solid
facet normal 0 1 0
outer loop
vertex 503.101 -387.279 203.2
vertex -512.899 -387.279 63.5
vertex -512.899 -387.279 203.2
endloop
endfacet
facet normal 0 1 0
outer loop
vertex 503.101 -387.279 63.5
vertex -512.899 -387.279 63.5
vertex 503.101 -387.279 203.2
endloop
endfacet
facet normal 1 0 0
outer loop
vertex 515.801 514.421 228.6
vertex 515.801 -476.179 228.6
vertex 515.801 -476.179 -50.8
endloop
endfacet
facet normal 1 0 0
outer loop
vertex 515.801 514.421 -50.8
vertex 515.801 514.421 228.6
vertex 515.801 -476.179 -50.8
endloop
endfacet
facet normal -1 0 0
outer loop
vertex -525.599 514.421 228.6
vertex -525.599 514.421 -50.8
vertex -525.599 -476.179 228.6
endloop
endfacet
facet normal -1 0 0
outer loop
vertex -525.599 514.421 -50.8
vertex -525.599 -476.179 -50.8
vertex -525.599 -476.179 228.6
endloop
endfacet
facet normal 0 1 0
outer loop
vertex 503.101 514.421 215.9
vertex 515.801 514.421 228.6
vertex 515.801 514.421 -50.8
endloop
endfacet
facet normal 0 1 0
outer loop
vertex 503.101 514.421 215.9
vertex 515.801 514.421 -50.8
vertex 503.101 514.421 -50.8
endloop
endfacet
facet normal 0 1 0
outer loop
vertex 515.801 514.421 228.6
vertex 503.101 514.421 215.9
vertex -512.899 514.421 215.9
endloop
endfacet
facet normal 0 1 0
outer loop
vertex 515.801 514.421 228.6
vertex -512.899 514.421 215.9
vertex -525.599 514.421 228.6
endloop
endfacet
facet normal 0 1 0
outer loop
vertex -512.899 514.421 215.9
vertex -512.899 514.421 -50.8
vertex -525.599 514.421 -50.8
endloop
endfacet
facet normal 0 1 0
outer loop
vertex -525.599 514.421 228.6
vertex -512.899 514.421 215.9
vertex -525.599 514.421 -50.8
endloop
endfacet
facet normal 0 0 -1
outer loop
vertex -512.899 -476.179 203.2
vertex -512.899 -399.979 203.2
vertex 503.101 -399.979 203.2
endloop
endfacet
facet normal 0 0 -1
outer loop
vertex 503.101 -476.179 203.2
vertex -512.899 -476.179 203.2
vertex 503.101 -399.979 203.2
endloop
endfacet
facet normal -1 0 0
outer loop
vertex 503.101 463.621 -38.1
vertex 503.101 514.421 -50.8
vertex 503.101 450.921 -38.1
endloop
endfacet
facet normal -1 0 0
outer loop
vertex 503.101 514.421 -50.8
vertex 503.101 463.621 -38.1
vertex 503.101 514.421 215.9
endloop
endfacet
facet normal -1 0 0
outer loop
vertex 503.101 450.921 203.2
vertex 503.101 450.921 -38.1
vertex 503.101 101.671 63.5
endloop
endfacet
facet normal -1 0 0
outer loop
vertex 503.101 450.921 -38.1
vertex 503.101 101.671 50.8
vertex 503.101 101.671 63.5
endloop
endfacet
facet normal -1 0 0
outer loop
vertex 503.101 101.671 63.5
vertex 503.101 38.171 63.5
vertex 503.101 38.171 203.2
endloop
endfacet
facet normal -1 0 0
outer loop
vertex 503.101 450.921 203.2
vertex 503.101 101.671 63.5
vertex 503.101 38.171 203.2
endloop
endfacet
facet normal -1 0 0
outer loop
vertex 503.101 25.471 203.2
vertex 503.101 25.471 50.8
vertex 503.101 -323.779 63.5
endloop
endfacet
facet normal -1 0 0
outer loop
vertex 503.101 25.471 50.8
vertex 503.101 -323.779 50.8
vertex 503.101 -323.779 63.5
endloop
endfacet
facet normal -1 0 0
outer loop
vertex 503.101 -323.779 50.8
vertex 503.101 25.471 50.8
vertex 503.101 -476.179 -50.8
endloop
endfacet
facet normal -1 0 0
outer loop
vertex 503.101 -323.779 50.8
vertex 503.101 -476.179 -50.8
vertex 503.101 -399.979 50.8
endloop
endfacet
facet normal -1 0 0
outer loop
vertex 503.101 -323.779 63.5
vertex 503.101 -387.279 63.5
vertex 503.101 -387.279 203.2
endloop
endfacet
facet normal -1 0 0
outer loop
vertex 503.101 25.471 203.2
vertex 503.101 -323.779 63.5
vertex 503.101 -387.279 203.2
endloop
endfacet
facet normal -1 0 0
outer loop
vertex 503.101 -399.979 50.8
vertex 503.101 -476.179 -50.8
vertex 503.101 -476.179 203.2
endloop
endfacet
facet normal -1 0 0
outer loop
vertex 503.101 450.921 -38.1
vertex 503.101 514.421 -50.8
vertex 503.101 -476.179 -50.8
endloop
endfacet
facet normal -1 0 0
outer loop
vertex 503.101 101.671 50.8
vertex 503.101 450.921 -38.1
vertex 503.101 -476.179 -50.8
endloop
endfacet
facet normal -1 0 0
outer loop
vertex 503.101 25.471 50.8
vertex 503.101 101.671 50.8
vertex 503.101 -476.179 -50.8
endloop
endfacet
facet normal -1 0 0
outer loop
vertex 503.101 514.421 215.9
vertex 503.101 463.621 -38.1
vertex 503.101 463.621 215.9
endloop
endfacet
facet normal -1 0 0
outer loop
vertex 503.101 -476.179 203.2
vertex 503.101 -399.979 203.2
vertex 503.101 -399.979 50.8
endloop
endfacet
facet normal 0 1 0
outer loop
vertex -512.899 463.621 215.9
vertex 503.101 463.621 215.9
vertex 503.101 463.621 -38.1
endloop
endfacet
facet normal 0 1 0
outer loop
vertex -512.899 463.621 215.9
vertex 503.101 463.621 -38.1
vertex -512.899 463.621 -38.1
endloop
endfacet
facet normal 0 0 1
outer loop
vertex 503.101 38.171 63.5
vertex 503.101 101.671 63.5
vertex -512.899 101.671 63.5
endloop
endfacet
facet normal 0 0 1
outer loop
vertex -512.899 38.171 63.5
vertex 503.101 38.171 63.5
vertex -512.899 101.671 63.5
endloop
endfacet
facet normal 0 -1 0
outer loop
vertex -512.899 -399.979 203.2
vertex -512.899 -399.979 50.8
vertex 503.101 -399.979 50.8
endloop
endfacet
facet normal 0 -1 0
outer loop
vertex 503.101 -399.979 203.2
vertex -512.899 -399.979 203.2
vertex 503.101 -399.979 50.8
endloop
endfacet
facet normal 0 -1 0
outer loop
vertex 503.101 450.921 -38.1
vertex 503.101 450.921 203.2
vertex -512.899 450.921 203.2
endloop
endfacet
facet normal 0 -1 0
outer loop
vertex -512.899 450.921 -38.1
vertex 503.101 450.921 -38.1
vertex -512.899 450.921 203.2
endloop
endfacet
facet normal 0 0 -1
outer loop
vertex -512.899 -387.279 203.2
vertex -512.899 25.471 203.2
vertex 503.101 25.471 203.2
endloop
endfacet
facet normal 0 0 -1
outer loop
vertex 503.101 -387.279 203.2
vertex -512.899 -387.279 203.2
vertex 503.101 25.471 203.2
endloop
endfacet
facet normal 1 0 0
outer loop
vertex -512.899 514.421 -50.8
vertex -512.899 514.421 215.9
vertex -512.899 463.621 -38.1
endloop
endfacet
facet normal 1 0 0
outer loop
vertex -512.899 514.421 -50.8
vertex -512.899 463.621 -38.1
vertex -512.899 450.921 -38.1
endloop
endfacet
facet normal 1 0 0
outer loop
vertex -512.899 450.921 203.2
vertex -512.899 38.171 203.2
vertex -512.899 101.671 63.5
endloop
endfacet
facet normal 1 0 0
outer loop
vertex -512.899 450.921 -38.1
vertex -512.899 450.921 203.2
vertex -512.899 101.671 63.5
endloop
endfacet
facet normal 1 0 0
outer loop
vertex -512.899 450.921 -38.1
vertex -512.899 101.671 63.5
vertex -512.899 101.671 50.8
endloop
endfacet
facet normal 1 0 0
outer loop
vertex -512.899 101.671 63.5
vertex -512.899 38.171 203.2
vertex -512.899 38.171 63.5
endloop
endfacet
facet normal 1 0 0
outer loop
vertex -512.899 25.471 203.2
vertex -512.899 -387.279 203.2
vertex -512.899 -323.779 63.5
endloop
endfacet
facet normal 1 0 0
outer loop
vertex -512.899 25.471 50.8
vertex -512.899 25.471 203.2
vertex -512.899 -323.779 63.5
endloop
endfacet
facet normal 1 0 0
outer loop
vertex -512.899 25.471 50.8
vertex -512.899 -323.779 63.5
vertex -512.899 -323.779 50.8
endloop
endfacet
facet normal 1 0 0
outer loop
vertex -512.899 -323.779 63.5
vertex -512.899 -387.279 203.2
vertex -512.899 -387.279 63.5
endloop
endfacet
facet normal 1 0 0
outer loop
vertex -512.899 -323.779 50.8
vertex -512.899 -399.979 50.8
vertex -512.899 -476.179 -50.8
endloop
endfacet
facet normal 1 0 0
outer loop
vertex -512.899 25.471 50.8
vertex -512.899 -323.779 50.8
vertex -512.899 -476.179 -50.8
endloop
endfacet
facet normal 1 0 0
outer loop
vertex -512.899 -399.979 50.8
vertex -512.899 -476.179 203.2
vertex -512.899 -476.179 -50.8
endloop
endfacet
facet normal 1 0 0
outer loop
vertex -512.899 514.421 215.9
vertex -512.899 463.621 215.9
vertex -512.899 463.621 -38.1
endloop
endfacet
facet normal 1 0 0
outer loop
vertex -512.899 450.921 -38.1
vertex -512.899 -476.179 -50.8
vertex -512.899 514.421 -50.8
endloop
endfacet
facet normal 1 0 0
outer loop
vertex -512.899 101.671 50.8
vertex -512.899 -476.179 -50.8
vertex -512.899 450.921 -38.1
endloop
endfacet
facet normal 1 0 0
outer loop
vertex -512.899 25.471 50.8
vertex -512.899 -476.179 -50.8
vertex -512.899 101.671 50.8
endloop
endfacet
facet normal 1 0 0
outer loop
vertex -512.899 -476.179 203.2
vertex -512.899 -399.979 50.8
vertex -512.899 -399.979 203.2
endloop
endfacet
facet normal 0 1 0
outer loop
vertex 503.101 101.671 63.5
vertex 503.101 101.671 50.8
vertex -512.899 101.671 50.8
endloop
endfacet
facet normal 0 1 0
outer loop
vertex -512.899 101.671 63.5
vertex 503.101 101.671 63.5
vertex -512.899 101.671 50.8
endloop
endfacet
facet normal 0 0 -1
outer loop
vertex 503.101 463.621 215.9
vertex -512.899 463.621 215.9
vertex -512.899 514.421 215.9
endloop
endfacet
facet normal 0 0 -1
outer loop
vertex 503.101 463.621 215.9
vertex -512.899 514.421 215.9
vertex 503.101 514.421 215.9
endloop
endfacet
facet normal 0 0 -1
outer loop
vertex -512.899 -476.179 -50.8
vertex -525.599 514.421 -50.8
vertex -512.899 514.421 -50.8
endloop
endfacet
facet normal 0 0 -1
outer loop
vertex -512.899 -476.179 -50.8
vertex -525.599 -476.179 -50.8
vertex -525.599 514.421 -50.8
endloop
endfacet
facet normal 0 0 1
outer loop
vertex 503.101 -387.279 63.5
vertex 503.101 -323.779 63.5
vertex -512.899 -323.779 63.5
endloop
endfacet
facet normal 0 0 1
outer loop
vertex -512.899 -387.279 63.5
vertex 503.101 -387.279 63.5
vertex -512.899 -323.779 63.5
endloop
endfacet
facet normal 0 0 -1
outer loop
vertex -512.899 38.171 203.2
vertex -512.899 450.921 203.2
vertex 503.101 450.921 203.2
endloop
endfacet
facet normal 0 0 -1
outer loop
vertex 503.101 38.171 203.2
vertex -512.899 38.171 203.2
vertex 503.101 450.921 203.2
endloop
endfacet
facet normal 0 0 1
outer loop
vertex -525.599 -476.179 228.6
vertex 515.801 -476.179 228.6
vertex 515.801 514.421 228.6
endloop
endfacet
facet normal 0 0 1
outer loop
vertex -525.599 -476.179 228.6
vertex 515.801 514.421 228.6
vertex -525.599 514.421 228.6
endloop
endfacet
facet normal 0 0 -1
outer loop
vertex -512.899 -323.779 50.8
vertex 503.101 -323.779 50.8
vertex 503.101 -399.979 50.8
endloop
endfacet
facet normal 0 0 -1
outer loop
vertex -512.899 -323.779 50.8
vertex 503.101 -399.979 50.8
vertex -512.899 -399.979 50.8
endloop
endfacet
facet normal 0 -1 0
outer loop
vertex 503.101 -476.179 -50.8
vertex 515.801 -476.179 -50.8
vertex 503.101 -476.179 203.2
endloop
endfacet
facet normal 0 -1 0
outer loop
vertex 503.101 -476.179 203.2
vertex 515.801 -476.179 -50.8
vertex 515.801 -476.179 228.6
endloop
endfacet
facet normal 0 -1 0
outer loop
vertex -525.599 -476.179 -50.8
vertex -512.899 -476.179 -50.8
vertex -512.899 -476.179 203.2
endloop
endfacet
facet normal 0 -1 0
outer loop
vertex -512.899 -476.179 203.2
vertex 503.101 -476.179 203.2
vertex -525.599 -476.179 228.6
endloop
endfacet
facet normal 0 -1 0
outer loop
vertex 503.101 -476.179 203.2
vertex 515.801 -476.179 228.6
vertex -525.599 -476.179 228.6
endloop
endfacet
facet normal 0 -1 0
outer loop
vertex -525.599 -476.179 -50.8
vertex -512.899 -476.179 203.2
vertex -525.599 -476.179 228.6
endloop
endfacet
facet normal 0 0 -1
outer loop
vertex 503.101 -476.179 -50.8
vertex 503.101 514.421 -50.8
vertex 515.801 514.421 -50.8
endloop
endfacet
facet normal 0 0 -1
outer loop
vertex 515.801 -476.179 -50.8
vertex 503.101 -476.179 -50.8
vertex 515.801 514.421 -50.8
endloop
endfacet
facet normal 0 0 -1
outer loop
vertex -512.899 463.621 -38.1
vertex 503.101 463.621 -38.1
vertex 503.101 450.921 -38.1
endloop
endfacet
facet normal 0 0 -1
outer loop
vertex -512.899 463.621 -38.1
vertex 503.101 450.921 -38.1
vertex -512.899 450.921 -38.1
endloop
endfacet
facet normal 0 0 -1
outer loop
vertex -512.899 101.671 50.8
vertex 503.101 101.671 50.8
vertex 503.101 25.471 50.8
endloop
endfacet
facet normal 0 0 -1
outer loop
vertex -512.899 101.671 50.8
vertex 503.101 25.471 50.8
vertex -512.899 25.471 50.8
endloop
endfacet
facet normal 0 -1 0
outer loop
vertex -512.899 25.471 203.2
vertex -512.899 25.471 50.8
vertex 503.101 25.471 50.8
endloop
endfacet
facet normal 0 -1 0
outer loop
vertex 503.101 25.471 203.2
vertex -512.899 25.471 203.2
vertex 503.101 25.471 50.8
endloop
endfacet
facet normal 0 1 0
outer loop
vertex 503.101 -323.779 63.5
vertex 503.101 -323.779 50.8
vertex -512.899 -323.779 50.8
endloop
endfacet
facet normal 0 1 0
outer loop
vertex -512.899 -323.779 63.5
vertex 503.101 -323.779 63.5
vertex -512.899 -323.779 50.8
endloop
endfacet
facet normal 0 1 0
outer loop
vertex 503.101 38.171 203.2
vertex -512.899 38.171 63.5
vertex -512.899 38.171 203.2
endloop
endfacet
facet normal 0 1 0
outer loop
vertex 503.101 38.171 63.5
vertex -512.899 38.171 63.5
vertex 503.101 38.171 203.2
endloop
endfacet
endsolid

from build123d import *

# Parameters (mm, degrees)
SKETCH1_W            = 1016
SKETCH1_H            = 412.75
BOSS_EXTRUDE2_DEPTH  = 203.2
SKETCH3_W            = 1041.4
SKETCH3_H            = 939.8
BOSS_EXTRUDE4_DEPTH  = 25.4
SKETCH6_W            = 12.7
SKETCH6_H            = 939.8
BOSS_EXTRUDE7_DEPTH  = 50.8
SKETCH7_W            = 12.7
SKETCH7_H            = 939.8
BOSS_EXTRUDE8_DEPTH  = 50.8
BOSS_EXTRUDE9_DEPTH  = 50.8
SKETCH10_W           = 1016
SKETCH10_H           = 514.35
CUT_EXTRUDE1_DEPTH   = 50.8
SKETCH11_W           = 1016
SKETCH11_H           = 12.7
BOSS_EXTRUDE11_DEPTH = 38.1
SKETCH13_W           = 1016
SKETCH13_H           = 76.2
BOSS_EXTRUDE12_DEPTH = 12.7


with BuildPart() as part:
    # Sketch1 → Boss-Extrude2 (new body)
    with BuildSketch(Plane.XY):
        Polygon((-512.899336879, -399.978806382), (503.100663121, -399.978806382), (503.100663121, -463.478806382), (503.100663121, -476.178806382), (515.800663121, -476.178806382), (515.800663121, 463.621193618), (-525.599336879, 463.621193618), (-525.599336879, -476.178806382), (-512.899336879, -476.178806382), (-512.899336879, -463.478806382), align=None)
        with Locations((-4.899336879, 244.546193618)):
            Rectangle(SKETCH1_W, SKETCH1_H, mode=Mode.SUBTRACT)
        with Locations((-4.899336879, -180.903806382)):
            Rectangle(SKETCH1_W, SKETCH1_H, mode=Mode.SUBTRACT)
    extrude(amount=BOSS_EXTRUDE2_DEPTH)

    # Sketch3 → Boss-Extrude4 (add)
    with BuildSketch(Plane.XY.offset(203.2)):
        with Locations((-4.899336879, -6.278806382)):
            Rectangle(SKETCH3_W, SKETCH3_H)
    extrude(amount=BOSS_EXTRUDE4_DEPTH)

    # Sketch6 → Boss-Extrude7 (add)
    with BuildSketch(Plane(origin=(0, 0, 0), x_dir=(-1, 0, 0), z_dir=(0, 0, -1))):
        with Locations((-509.450663121, -6.278806382)):
            Rectangle(SKETCH6_W, SKETCH6_H)
    extrude(amount=BOSS_EXTRUDE7_DEPTH)

    # Sketch7 → Boss-Extrude8 (add)
    with BuildSketch(Plane(origin=(0, 0, 0), x_dir=(-1, 0, 0), z_dir=(0, 0, -1))):
        with Locations((519.249336879, -6.278806382)):
            Rectangle(SKETCH7_W, SKETCH7_H)
    extrude(amount=BOSS_EXTRUDE8_DEPTH)

    # Sketch8 → Boss-Extrude9 (add)
    with BuildSketch(Plane(origin=(0, 463.621193618, 0), x_dir=(1, 0, 0), z_dir=(0, 1, 0))):
        Polygon((-512.899336879, 0), (-512.899336879, -215.9), (503.100663121, -215.9), (503.100663121, 0), (503.100663121, 50.8), (515.800663121, 50.8), (515.800663121, 0), (515.800663121, -228.6), (-525.599336879, -228.6), (-525.599336879, 0), (-525.599336879, 50.8), (-512.899336879, 50.8), align=None)
    extrude(amount=BOSS_EXTRUDE9_DEPTH)

    # Sketch10 → Cut-Extrude1 (cut)
    with BuildSketch(Plane(origin=(0, 0, 0), x_dir=(-1, 0, 0), z_dir=(0, 0, -1))):
        with Locations((4.899336879, -219.003806382)):
            Rectangle(SKETCH10_W, SKETCH10_H)
    extrude(amount=-CUT_EXTRUDE1_DEPTH, mode=Mode.SUBTRACT)

    # Sketch11 → Boss-Extrude11 (add)
    with BuildSketch(Plane(origin=(0, 0, 0), x_dir=(-1, 0, 0), z_dir=(0, 0, -1))):
        with Locations((4.899336879, 457.271193618)):
            Rectangle(SKETCH11_W, SKETCH11_H)
    extrude(amount=BOSS_EXTRUDE11_DEPTH)

    # Sketch13 → Boss-Extrude12 (add)
    with BuildSketch(Plane(origin=(0, 0, 50.8), x_dir=(-1, 0, 0), z_dir=(0, 0, -1))):
        with Locations((4.899336879, 63.571193618)):
            Rectangle(SKETCH13_W, SKETCH13_H)
        with Locations((4.899336879, -361.878806382)):
            Rectangle(SKETCH13_W, SKETCH13_H)
    extrude(amount=-BOSS_EXTRUDE12_DEPTH)


solid = part.part
